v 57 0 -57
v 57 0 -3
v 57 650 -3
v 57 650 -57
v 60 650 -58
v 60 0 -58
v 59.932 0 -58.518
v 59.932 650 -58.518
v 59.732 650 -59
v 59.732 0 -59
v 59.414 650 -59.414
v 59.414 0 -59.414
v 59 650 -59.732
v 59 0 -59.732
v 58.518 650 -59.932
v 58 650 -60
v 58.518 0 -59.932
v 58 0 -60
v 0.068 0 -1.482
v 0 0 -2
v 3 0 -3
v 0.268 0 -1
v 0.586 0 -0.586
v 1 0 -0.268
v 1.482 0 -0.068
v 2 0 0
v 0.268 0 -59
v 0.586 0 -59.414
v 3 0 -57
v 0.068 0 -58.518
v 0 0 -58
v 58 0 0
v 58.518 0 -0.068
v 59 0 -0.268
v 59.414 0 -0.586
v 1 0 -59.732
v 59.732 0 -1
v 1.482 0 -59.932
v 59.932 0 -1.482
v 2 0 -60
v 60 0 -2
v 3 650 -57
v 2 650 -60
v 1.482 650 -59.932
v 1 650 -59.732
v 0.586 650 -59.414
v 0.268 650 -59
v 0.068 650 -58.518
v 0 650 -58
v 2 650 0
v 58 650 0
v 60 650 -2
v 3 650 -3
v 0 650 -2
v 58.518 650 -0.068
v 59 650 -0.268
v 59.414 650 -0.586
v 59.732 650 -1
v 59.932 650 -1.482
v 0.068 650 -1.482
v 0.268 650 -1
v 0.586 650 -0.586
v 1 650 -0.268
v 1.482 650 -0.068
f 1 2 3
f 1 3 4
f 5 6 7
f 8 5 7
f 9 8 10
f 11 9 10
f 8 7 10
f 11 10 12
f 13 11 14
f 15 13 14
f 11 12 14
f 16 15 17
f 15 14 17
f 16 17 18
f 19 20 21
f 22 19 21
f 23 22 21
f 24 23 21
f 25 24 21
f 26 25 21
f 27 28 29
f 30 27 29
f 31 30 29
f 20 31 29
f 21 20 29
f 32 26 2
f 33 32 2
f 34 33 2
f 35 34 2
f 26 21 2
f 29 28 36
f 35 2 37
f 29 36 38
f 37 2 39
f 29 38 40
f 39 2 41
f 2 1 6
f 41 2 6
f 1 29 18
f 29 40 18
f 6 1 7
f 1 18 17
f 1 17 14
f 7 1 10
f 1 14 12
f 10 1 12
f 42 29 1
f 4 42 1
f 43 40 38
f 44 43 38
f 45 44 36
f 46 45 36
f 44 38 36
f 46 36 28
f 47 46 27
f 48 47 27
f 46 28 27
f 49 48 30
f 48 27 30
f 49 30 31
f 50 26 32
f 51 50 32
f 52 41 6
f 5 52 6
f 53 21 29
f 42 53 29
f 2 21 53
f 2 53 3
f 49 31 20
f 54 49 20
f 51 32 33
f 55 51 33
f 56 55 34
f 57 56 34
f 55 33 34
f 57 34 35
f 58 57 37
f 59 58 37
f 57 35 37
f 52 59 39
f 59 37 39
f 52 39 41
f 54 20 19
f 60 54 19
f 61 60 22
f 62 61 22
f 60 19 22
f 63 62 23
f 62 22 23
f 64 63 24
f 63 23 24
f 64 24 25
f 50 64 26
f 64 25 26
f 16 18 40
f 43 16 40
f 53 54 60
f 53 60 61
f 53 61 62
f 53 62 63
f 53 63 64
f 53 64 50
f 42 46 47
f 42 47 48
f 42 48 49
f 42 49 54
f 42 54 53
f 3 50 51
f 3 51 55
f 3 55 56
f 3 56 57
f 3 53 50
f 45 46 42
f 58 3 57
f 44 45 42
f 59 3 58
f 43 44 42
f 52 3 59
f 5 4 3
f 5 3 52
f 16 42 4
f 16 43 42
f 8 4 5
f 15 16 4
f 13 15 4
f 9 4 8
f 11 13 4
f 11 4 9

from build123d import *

# Parameters (mm, degrees)
SKETCH1_W           = 54
SKETCH1_H           = 54
BOSS_EXTRUDE1_DEPTH = 650


with BuildPart() as part:
    # Sketch1 → Boss-Extrude1 (new body)
    with BuildSketch(Plane(origin=(0, 0, 0), x_dir=(1, 0, 0), z_dir=(0, 1, 0))):
        with BuildLine():
            Line((2, 0), (58, 0))
            ThreePointArc((58, 0), (59.414213562, 0.585786438), (60, 2))
            Line((60, 2), (60, 58))
            ThreePointArc((60, 58), (59.414213562, 59.414213562), (58, 60))
            Line((58, 60), (2, 60))
            ThreePointArc((2, 60), (0.585786438, 59.414213562), (0, 58))
            Line((0, 58), (0, 2))
            ThreePointArc((0, 2), (0.585786438, 0.585786438), (2, 0))
        make_face()
        with Locations((30, 30)):
            Rectangle(SKETCH1_W, SKETCH1_H, mode=Mode.SUBTRACT)
    extrude(amount=BOSS_EXTRUDE1_DEPTH)


solid = part.part
